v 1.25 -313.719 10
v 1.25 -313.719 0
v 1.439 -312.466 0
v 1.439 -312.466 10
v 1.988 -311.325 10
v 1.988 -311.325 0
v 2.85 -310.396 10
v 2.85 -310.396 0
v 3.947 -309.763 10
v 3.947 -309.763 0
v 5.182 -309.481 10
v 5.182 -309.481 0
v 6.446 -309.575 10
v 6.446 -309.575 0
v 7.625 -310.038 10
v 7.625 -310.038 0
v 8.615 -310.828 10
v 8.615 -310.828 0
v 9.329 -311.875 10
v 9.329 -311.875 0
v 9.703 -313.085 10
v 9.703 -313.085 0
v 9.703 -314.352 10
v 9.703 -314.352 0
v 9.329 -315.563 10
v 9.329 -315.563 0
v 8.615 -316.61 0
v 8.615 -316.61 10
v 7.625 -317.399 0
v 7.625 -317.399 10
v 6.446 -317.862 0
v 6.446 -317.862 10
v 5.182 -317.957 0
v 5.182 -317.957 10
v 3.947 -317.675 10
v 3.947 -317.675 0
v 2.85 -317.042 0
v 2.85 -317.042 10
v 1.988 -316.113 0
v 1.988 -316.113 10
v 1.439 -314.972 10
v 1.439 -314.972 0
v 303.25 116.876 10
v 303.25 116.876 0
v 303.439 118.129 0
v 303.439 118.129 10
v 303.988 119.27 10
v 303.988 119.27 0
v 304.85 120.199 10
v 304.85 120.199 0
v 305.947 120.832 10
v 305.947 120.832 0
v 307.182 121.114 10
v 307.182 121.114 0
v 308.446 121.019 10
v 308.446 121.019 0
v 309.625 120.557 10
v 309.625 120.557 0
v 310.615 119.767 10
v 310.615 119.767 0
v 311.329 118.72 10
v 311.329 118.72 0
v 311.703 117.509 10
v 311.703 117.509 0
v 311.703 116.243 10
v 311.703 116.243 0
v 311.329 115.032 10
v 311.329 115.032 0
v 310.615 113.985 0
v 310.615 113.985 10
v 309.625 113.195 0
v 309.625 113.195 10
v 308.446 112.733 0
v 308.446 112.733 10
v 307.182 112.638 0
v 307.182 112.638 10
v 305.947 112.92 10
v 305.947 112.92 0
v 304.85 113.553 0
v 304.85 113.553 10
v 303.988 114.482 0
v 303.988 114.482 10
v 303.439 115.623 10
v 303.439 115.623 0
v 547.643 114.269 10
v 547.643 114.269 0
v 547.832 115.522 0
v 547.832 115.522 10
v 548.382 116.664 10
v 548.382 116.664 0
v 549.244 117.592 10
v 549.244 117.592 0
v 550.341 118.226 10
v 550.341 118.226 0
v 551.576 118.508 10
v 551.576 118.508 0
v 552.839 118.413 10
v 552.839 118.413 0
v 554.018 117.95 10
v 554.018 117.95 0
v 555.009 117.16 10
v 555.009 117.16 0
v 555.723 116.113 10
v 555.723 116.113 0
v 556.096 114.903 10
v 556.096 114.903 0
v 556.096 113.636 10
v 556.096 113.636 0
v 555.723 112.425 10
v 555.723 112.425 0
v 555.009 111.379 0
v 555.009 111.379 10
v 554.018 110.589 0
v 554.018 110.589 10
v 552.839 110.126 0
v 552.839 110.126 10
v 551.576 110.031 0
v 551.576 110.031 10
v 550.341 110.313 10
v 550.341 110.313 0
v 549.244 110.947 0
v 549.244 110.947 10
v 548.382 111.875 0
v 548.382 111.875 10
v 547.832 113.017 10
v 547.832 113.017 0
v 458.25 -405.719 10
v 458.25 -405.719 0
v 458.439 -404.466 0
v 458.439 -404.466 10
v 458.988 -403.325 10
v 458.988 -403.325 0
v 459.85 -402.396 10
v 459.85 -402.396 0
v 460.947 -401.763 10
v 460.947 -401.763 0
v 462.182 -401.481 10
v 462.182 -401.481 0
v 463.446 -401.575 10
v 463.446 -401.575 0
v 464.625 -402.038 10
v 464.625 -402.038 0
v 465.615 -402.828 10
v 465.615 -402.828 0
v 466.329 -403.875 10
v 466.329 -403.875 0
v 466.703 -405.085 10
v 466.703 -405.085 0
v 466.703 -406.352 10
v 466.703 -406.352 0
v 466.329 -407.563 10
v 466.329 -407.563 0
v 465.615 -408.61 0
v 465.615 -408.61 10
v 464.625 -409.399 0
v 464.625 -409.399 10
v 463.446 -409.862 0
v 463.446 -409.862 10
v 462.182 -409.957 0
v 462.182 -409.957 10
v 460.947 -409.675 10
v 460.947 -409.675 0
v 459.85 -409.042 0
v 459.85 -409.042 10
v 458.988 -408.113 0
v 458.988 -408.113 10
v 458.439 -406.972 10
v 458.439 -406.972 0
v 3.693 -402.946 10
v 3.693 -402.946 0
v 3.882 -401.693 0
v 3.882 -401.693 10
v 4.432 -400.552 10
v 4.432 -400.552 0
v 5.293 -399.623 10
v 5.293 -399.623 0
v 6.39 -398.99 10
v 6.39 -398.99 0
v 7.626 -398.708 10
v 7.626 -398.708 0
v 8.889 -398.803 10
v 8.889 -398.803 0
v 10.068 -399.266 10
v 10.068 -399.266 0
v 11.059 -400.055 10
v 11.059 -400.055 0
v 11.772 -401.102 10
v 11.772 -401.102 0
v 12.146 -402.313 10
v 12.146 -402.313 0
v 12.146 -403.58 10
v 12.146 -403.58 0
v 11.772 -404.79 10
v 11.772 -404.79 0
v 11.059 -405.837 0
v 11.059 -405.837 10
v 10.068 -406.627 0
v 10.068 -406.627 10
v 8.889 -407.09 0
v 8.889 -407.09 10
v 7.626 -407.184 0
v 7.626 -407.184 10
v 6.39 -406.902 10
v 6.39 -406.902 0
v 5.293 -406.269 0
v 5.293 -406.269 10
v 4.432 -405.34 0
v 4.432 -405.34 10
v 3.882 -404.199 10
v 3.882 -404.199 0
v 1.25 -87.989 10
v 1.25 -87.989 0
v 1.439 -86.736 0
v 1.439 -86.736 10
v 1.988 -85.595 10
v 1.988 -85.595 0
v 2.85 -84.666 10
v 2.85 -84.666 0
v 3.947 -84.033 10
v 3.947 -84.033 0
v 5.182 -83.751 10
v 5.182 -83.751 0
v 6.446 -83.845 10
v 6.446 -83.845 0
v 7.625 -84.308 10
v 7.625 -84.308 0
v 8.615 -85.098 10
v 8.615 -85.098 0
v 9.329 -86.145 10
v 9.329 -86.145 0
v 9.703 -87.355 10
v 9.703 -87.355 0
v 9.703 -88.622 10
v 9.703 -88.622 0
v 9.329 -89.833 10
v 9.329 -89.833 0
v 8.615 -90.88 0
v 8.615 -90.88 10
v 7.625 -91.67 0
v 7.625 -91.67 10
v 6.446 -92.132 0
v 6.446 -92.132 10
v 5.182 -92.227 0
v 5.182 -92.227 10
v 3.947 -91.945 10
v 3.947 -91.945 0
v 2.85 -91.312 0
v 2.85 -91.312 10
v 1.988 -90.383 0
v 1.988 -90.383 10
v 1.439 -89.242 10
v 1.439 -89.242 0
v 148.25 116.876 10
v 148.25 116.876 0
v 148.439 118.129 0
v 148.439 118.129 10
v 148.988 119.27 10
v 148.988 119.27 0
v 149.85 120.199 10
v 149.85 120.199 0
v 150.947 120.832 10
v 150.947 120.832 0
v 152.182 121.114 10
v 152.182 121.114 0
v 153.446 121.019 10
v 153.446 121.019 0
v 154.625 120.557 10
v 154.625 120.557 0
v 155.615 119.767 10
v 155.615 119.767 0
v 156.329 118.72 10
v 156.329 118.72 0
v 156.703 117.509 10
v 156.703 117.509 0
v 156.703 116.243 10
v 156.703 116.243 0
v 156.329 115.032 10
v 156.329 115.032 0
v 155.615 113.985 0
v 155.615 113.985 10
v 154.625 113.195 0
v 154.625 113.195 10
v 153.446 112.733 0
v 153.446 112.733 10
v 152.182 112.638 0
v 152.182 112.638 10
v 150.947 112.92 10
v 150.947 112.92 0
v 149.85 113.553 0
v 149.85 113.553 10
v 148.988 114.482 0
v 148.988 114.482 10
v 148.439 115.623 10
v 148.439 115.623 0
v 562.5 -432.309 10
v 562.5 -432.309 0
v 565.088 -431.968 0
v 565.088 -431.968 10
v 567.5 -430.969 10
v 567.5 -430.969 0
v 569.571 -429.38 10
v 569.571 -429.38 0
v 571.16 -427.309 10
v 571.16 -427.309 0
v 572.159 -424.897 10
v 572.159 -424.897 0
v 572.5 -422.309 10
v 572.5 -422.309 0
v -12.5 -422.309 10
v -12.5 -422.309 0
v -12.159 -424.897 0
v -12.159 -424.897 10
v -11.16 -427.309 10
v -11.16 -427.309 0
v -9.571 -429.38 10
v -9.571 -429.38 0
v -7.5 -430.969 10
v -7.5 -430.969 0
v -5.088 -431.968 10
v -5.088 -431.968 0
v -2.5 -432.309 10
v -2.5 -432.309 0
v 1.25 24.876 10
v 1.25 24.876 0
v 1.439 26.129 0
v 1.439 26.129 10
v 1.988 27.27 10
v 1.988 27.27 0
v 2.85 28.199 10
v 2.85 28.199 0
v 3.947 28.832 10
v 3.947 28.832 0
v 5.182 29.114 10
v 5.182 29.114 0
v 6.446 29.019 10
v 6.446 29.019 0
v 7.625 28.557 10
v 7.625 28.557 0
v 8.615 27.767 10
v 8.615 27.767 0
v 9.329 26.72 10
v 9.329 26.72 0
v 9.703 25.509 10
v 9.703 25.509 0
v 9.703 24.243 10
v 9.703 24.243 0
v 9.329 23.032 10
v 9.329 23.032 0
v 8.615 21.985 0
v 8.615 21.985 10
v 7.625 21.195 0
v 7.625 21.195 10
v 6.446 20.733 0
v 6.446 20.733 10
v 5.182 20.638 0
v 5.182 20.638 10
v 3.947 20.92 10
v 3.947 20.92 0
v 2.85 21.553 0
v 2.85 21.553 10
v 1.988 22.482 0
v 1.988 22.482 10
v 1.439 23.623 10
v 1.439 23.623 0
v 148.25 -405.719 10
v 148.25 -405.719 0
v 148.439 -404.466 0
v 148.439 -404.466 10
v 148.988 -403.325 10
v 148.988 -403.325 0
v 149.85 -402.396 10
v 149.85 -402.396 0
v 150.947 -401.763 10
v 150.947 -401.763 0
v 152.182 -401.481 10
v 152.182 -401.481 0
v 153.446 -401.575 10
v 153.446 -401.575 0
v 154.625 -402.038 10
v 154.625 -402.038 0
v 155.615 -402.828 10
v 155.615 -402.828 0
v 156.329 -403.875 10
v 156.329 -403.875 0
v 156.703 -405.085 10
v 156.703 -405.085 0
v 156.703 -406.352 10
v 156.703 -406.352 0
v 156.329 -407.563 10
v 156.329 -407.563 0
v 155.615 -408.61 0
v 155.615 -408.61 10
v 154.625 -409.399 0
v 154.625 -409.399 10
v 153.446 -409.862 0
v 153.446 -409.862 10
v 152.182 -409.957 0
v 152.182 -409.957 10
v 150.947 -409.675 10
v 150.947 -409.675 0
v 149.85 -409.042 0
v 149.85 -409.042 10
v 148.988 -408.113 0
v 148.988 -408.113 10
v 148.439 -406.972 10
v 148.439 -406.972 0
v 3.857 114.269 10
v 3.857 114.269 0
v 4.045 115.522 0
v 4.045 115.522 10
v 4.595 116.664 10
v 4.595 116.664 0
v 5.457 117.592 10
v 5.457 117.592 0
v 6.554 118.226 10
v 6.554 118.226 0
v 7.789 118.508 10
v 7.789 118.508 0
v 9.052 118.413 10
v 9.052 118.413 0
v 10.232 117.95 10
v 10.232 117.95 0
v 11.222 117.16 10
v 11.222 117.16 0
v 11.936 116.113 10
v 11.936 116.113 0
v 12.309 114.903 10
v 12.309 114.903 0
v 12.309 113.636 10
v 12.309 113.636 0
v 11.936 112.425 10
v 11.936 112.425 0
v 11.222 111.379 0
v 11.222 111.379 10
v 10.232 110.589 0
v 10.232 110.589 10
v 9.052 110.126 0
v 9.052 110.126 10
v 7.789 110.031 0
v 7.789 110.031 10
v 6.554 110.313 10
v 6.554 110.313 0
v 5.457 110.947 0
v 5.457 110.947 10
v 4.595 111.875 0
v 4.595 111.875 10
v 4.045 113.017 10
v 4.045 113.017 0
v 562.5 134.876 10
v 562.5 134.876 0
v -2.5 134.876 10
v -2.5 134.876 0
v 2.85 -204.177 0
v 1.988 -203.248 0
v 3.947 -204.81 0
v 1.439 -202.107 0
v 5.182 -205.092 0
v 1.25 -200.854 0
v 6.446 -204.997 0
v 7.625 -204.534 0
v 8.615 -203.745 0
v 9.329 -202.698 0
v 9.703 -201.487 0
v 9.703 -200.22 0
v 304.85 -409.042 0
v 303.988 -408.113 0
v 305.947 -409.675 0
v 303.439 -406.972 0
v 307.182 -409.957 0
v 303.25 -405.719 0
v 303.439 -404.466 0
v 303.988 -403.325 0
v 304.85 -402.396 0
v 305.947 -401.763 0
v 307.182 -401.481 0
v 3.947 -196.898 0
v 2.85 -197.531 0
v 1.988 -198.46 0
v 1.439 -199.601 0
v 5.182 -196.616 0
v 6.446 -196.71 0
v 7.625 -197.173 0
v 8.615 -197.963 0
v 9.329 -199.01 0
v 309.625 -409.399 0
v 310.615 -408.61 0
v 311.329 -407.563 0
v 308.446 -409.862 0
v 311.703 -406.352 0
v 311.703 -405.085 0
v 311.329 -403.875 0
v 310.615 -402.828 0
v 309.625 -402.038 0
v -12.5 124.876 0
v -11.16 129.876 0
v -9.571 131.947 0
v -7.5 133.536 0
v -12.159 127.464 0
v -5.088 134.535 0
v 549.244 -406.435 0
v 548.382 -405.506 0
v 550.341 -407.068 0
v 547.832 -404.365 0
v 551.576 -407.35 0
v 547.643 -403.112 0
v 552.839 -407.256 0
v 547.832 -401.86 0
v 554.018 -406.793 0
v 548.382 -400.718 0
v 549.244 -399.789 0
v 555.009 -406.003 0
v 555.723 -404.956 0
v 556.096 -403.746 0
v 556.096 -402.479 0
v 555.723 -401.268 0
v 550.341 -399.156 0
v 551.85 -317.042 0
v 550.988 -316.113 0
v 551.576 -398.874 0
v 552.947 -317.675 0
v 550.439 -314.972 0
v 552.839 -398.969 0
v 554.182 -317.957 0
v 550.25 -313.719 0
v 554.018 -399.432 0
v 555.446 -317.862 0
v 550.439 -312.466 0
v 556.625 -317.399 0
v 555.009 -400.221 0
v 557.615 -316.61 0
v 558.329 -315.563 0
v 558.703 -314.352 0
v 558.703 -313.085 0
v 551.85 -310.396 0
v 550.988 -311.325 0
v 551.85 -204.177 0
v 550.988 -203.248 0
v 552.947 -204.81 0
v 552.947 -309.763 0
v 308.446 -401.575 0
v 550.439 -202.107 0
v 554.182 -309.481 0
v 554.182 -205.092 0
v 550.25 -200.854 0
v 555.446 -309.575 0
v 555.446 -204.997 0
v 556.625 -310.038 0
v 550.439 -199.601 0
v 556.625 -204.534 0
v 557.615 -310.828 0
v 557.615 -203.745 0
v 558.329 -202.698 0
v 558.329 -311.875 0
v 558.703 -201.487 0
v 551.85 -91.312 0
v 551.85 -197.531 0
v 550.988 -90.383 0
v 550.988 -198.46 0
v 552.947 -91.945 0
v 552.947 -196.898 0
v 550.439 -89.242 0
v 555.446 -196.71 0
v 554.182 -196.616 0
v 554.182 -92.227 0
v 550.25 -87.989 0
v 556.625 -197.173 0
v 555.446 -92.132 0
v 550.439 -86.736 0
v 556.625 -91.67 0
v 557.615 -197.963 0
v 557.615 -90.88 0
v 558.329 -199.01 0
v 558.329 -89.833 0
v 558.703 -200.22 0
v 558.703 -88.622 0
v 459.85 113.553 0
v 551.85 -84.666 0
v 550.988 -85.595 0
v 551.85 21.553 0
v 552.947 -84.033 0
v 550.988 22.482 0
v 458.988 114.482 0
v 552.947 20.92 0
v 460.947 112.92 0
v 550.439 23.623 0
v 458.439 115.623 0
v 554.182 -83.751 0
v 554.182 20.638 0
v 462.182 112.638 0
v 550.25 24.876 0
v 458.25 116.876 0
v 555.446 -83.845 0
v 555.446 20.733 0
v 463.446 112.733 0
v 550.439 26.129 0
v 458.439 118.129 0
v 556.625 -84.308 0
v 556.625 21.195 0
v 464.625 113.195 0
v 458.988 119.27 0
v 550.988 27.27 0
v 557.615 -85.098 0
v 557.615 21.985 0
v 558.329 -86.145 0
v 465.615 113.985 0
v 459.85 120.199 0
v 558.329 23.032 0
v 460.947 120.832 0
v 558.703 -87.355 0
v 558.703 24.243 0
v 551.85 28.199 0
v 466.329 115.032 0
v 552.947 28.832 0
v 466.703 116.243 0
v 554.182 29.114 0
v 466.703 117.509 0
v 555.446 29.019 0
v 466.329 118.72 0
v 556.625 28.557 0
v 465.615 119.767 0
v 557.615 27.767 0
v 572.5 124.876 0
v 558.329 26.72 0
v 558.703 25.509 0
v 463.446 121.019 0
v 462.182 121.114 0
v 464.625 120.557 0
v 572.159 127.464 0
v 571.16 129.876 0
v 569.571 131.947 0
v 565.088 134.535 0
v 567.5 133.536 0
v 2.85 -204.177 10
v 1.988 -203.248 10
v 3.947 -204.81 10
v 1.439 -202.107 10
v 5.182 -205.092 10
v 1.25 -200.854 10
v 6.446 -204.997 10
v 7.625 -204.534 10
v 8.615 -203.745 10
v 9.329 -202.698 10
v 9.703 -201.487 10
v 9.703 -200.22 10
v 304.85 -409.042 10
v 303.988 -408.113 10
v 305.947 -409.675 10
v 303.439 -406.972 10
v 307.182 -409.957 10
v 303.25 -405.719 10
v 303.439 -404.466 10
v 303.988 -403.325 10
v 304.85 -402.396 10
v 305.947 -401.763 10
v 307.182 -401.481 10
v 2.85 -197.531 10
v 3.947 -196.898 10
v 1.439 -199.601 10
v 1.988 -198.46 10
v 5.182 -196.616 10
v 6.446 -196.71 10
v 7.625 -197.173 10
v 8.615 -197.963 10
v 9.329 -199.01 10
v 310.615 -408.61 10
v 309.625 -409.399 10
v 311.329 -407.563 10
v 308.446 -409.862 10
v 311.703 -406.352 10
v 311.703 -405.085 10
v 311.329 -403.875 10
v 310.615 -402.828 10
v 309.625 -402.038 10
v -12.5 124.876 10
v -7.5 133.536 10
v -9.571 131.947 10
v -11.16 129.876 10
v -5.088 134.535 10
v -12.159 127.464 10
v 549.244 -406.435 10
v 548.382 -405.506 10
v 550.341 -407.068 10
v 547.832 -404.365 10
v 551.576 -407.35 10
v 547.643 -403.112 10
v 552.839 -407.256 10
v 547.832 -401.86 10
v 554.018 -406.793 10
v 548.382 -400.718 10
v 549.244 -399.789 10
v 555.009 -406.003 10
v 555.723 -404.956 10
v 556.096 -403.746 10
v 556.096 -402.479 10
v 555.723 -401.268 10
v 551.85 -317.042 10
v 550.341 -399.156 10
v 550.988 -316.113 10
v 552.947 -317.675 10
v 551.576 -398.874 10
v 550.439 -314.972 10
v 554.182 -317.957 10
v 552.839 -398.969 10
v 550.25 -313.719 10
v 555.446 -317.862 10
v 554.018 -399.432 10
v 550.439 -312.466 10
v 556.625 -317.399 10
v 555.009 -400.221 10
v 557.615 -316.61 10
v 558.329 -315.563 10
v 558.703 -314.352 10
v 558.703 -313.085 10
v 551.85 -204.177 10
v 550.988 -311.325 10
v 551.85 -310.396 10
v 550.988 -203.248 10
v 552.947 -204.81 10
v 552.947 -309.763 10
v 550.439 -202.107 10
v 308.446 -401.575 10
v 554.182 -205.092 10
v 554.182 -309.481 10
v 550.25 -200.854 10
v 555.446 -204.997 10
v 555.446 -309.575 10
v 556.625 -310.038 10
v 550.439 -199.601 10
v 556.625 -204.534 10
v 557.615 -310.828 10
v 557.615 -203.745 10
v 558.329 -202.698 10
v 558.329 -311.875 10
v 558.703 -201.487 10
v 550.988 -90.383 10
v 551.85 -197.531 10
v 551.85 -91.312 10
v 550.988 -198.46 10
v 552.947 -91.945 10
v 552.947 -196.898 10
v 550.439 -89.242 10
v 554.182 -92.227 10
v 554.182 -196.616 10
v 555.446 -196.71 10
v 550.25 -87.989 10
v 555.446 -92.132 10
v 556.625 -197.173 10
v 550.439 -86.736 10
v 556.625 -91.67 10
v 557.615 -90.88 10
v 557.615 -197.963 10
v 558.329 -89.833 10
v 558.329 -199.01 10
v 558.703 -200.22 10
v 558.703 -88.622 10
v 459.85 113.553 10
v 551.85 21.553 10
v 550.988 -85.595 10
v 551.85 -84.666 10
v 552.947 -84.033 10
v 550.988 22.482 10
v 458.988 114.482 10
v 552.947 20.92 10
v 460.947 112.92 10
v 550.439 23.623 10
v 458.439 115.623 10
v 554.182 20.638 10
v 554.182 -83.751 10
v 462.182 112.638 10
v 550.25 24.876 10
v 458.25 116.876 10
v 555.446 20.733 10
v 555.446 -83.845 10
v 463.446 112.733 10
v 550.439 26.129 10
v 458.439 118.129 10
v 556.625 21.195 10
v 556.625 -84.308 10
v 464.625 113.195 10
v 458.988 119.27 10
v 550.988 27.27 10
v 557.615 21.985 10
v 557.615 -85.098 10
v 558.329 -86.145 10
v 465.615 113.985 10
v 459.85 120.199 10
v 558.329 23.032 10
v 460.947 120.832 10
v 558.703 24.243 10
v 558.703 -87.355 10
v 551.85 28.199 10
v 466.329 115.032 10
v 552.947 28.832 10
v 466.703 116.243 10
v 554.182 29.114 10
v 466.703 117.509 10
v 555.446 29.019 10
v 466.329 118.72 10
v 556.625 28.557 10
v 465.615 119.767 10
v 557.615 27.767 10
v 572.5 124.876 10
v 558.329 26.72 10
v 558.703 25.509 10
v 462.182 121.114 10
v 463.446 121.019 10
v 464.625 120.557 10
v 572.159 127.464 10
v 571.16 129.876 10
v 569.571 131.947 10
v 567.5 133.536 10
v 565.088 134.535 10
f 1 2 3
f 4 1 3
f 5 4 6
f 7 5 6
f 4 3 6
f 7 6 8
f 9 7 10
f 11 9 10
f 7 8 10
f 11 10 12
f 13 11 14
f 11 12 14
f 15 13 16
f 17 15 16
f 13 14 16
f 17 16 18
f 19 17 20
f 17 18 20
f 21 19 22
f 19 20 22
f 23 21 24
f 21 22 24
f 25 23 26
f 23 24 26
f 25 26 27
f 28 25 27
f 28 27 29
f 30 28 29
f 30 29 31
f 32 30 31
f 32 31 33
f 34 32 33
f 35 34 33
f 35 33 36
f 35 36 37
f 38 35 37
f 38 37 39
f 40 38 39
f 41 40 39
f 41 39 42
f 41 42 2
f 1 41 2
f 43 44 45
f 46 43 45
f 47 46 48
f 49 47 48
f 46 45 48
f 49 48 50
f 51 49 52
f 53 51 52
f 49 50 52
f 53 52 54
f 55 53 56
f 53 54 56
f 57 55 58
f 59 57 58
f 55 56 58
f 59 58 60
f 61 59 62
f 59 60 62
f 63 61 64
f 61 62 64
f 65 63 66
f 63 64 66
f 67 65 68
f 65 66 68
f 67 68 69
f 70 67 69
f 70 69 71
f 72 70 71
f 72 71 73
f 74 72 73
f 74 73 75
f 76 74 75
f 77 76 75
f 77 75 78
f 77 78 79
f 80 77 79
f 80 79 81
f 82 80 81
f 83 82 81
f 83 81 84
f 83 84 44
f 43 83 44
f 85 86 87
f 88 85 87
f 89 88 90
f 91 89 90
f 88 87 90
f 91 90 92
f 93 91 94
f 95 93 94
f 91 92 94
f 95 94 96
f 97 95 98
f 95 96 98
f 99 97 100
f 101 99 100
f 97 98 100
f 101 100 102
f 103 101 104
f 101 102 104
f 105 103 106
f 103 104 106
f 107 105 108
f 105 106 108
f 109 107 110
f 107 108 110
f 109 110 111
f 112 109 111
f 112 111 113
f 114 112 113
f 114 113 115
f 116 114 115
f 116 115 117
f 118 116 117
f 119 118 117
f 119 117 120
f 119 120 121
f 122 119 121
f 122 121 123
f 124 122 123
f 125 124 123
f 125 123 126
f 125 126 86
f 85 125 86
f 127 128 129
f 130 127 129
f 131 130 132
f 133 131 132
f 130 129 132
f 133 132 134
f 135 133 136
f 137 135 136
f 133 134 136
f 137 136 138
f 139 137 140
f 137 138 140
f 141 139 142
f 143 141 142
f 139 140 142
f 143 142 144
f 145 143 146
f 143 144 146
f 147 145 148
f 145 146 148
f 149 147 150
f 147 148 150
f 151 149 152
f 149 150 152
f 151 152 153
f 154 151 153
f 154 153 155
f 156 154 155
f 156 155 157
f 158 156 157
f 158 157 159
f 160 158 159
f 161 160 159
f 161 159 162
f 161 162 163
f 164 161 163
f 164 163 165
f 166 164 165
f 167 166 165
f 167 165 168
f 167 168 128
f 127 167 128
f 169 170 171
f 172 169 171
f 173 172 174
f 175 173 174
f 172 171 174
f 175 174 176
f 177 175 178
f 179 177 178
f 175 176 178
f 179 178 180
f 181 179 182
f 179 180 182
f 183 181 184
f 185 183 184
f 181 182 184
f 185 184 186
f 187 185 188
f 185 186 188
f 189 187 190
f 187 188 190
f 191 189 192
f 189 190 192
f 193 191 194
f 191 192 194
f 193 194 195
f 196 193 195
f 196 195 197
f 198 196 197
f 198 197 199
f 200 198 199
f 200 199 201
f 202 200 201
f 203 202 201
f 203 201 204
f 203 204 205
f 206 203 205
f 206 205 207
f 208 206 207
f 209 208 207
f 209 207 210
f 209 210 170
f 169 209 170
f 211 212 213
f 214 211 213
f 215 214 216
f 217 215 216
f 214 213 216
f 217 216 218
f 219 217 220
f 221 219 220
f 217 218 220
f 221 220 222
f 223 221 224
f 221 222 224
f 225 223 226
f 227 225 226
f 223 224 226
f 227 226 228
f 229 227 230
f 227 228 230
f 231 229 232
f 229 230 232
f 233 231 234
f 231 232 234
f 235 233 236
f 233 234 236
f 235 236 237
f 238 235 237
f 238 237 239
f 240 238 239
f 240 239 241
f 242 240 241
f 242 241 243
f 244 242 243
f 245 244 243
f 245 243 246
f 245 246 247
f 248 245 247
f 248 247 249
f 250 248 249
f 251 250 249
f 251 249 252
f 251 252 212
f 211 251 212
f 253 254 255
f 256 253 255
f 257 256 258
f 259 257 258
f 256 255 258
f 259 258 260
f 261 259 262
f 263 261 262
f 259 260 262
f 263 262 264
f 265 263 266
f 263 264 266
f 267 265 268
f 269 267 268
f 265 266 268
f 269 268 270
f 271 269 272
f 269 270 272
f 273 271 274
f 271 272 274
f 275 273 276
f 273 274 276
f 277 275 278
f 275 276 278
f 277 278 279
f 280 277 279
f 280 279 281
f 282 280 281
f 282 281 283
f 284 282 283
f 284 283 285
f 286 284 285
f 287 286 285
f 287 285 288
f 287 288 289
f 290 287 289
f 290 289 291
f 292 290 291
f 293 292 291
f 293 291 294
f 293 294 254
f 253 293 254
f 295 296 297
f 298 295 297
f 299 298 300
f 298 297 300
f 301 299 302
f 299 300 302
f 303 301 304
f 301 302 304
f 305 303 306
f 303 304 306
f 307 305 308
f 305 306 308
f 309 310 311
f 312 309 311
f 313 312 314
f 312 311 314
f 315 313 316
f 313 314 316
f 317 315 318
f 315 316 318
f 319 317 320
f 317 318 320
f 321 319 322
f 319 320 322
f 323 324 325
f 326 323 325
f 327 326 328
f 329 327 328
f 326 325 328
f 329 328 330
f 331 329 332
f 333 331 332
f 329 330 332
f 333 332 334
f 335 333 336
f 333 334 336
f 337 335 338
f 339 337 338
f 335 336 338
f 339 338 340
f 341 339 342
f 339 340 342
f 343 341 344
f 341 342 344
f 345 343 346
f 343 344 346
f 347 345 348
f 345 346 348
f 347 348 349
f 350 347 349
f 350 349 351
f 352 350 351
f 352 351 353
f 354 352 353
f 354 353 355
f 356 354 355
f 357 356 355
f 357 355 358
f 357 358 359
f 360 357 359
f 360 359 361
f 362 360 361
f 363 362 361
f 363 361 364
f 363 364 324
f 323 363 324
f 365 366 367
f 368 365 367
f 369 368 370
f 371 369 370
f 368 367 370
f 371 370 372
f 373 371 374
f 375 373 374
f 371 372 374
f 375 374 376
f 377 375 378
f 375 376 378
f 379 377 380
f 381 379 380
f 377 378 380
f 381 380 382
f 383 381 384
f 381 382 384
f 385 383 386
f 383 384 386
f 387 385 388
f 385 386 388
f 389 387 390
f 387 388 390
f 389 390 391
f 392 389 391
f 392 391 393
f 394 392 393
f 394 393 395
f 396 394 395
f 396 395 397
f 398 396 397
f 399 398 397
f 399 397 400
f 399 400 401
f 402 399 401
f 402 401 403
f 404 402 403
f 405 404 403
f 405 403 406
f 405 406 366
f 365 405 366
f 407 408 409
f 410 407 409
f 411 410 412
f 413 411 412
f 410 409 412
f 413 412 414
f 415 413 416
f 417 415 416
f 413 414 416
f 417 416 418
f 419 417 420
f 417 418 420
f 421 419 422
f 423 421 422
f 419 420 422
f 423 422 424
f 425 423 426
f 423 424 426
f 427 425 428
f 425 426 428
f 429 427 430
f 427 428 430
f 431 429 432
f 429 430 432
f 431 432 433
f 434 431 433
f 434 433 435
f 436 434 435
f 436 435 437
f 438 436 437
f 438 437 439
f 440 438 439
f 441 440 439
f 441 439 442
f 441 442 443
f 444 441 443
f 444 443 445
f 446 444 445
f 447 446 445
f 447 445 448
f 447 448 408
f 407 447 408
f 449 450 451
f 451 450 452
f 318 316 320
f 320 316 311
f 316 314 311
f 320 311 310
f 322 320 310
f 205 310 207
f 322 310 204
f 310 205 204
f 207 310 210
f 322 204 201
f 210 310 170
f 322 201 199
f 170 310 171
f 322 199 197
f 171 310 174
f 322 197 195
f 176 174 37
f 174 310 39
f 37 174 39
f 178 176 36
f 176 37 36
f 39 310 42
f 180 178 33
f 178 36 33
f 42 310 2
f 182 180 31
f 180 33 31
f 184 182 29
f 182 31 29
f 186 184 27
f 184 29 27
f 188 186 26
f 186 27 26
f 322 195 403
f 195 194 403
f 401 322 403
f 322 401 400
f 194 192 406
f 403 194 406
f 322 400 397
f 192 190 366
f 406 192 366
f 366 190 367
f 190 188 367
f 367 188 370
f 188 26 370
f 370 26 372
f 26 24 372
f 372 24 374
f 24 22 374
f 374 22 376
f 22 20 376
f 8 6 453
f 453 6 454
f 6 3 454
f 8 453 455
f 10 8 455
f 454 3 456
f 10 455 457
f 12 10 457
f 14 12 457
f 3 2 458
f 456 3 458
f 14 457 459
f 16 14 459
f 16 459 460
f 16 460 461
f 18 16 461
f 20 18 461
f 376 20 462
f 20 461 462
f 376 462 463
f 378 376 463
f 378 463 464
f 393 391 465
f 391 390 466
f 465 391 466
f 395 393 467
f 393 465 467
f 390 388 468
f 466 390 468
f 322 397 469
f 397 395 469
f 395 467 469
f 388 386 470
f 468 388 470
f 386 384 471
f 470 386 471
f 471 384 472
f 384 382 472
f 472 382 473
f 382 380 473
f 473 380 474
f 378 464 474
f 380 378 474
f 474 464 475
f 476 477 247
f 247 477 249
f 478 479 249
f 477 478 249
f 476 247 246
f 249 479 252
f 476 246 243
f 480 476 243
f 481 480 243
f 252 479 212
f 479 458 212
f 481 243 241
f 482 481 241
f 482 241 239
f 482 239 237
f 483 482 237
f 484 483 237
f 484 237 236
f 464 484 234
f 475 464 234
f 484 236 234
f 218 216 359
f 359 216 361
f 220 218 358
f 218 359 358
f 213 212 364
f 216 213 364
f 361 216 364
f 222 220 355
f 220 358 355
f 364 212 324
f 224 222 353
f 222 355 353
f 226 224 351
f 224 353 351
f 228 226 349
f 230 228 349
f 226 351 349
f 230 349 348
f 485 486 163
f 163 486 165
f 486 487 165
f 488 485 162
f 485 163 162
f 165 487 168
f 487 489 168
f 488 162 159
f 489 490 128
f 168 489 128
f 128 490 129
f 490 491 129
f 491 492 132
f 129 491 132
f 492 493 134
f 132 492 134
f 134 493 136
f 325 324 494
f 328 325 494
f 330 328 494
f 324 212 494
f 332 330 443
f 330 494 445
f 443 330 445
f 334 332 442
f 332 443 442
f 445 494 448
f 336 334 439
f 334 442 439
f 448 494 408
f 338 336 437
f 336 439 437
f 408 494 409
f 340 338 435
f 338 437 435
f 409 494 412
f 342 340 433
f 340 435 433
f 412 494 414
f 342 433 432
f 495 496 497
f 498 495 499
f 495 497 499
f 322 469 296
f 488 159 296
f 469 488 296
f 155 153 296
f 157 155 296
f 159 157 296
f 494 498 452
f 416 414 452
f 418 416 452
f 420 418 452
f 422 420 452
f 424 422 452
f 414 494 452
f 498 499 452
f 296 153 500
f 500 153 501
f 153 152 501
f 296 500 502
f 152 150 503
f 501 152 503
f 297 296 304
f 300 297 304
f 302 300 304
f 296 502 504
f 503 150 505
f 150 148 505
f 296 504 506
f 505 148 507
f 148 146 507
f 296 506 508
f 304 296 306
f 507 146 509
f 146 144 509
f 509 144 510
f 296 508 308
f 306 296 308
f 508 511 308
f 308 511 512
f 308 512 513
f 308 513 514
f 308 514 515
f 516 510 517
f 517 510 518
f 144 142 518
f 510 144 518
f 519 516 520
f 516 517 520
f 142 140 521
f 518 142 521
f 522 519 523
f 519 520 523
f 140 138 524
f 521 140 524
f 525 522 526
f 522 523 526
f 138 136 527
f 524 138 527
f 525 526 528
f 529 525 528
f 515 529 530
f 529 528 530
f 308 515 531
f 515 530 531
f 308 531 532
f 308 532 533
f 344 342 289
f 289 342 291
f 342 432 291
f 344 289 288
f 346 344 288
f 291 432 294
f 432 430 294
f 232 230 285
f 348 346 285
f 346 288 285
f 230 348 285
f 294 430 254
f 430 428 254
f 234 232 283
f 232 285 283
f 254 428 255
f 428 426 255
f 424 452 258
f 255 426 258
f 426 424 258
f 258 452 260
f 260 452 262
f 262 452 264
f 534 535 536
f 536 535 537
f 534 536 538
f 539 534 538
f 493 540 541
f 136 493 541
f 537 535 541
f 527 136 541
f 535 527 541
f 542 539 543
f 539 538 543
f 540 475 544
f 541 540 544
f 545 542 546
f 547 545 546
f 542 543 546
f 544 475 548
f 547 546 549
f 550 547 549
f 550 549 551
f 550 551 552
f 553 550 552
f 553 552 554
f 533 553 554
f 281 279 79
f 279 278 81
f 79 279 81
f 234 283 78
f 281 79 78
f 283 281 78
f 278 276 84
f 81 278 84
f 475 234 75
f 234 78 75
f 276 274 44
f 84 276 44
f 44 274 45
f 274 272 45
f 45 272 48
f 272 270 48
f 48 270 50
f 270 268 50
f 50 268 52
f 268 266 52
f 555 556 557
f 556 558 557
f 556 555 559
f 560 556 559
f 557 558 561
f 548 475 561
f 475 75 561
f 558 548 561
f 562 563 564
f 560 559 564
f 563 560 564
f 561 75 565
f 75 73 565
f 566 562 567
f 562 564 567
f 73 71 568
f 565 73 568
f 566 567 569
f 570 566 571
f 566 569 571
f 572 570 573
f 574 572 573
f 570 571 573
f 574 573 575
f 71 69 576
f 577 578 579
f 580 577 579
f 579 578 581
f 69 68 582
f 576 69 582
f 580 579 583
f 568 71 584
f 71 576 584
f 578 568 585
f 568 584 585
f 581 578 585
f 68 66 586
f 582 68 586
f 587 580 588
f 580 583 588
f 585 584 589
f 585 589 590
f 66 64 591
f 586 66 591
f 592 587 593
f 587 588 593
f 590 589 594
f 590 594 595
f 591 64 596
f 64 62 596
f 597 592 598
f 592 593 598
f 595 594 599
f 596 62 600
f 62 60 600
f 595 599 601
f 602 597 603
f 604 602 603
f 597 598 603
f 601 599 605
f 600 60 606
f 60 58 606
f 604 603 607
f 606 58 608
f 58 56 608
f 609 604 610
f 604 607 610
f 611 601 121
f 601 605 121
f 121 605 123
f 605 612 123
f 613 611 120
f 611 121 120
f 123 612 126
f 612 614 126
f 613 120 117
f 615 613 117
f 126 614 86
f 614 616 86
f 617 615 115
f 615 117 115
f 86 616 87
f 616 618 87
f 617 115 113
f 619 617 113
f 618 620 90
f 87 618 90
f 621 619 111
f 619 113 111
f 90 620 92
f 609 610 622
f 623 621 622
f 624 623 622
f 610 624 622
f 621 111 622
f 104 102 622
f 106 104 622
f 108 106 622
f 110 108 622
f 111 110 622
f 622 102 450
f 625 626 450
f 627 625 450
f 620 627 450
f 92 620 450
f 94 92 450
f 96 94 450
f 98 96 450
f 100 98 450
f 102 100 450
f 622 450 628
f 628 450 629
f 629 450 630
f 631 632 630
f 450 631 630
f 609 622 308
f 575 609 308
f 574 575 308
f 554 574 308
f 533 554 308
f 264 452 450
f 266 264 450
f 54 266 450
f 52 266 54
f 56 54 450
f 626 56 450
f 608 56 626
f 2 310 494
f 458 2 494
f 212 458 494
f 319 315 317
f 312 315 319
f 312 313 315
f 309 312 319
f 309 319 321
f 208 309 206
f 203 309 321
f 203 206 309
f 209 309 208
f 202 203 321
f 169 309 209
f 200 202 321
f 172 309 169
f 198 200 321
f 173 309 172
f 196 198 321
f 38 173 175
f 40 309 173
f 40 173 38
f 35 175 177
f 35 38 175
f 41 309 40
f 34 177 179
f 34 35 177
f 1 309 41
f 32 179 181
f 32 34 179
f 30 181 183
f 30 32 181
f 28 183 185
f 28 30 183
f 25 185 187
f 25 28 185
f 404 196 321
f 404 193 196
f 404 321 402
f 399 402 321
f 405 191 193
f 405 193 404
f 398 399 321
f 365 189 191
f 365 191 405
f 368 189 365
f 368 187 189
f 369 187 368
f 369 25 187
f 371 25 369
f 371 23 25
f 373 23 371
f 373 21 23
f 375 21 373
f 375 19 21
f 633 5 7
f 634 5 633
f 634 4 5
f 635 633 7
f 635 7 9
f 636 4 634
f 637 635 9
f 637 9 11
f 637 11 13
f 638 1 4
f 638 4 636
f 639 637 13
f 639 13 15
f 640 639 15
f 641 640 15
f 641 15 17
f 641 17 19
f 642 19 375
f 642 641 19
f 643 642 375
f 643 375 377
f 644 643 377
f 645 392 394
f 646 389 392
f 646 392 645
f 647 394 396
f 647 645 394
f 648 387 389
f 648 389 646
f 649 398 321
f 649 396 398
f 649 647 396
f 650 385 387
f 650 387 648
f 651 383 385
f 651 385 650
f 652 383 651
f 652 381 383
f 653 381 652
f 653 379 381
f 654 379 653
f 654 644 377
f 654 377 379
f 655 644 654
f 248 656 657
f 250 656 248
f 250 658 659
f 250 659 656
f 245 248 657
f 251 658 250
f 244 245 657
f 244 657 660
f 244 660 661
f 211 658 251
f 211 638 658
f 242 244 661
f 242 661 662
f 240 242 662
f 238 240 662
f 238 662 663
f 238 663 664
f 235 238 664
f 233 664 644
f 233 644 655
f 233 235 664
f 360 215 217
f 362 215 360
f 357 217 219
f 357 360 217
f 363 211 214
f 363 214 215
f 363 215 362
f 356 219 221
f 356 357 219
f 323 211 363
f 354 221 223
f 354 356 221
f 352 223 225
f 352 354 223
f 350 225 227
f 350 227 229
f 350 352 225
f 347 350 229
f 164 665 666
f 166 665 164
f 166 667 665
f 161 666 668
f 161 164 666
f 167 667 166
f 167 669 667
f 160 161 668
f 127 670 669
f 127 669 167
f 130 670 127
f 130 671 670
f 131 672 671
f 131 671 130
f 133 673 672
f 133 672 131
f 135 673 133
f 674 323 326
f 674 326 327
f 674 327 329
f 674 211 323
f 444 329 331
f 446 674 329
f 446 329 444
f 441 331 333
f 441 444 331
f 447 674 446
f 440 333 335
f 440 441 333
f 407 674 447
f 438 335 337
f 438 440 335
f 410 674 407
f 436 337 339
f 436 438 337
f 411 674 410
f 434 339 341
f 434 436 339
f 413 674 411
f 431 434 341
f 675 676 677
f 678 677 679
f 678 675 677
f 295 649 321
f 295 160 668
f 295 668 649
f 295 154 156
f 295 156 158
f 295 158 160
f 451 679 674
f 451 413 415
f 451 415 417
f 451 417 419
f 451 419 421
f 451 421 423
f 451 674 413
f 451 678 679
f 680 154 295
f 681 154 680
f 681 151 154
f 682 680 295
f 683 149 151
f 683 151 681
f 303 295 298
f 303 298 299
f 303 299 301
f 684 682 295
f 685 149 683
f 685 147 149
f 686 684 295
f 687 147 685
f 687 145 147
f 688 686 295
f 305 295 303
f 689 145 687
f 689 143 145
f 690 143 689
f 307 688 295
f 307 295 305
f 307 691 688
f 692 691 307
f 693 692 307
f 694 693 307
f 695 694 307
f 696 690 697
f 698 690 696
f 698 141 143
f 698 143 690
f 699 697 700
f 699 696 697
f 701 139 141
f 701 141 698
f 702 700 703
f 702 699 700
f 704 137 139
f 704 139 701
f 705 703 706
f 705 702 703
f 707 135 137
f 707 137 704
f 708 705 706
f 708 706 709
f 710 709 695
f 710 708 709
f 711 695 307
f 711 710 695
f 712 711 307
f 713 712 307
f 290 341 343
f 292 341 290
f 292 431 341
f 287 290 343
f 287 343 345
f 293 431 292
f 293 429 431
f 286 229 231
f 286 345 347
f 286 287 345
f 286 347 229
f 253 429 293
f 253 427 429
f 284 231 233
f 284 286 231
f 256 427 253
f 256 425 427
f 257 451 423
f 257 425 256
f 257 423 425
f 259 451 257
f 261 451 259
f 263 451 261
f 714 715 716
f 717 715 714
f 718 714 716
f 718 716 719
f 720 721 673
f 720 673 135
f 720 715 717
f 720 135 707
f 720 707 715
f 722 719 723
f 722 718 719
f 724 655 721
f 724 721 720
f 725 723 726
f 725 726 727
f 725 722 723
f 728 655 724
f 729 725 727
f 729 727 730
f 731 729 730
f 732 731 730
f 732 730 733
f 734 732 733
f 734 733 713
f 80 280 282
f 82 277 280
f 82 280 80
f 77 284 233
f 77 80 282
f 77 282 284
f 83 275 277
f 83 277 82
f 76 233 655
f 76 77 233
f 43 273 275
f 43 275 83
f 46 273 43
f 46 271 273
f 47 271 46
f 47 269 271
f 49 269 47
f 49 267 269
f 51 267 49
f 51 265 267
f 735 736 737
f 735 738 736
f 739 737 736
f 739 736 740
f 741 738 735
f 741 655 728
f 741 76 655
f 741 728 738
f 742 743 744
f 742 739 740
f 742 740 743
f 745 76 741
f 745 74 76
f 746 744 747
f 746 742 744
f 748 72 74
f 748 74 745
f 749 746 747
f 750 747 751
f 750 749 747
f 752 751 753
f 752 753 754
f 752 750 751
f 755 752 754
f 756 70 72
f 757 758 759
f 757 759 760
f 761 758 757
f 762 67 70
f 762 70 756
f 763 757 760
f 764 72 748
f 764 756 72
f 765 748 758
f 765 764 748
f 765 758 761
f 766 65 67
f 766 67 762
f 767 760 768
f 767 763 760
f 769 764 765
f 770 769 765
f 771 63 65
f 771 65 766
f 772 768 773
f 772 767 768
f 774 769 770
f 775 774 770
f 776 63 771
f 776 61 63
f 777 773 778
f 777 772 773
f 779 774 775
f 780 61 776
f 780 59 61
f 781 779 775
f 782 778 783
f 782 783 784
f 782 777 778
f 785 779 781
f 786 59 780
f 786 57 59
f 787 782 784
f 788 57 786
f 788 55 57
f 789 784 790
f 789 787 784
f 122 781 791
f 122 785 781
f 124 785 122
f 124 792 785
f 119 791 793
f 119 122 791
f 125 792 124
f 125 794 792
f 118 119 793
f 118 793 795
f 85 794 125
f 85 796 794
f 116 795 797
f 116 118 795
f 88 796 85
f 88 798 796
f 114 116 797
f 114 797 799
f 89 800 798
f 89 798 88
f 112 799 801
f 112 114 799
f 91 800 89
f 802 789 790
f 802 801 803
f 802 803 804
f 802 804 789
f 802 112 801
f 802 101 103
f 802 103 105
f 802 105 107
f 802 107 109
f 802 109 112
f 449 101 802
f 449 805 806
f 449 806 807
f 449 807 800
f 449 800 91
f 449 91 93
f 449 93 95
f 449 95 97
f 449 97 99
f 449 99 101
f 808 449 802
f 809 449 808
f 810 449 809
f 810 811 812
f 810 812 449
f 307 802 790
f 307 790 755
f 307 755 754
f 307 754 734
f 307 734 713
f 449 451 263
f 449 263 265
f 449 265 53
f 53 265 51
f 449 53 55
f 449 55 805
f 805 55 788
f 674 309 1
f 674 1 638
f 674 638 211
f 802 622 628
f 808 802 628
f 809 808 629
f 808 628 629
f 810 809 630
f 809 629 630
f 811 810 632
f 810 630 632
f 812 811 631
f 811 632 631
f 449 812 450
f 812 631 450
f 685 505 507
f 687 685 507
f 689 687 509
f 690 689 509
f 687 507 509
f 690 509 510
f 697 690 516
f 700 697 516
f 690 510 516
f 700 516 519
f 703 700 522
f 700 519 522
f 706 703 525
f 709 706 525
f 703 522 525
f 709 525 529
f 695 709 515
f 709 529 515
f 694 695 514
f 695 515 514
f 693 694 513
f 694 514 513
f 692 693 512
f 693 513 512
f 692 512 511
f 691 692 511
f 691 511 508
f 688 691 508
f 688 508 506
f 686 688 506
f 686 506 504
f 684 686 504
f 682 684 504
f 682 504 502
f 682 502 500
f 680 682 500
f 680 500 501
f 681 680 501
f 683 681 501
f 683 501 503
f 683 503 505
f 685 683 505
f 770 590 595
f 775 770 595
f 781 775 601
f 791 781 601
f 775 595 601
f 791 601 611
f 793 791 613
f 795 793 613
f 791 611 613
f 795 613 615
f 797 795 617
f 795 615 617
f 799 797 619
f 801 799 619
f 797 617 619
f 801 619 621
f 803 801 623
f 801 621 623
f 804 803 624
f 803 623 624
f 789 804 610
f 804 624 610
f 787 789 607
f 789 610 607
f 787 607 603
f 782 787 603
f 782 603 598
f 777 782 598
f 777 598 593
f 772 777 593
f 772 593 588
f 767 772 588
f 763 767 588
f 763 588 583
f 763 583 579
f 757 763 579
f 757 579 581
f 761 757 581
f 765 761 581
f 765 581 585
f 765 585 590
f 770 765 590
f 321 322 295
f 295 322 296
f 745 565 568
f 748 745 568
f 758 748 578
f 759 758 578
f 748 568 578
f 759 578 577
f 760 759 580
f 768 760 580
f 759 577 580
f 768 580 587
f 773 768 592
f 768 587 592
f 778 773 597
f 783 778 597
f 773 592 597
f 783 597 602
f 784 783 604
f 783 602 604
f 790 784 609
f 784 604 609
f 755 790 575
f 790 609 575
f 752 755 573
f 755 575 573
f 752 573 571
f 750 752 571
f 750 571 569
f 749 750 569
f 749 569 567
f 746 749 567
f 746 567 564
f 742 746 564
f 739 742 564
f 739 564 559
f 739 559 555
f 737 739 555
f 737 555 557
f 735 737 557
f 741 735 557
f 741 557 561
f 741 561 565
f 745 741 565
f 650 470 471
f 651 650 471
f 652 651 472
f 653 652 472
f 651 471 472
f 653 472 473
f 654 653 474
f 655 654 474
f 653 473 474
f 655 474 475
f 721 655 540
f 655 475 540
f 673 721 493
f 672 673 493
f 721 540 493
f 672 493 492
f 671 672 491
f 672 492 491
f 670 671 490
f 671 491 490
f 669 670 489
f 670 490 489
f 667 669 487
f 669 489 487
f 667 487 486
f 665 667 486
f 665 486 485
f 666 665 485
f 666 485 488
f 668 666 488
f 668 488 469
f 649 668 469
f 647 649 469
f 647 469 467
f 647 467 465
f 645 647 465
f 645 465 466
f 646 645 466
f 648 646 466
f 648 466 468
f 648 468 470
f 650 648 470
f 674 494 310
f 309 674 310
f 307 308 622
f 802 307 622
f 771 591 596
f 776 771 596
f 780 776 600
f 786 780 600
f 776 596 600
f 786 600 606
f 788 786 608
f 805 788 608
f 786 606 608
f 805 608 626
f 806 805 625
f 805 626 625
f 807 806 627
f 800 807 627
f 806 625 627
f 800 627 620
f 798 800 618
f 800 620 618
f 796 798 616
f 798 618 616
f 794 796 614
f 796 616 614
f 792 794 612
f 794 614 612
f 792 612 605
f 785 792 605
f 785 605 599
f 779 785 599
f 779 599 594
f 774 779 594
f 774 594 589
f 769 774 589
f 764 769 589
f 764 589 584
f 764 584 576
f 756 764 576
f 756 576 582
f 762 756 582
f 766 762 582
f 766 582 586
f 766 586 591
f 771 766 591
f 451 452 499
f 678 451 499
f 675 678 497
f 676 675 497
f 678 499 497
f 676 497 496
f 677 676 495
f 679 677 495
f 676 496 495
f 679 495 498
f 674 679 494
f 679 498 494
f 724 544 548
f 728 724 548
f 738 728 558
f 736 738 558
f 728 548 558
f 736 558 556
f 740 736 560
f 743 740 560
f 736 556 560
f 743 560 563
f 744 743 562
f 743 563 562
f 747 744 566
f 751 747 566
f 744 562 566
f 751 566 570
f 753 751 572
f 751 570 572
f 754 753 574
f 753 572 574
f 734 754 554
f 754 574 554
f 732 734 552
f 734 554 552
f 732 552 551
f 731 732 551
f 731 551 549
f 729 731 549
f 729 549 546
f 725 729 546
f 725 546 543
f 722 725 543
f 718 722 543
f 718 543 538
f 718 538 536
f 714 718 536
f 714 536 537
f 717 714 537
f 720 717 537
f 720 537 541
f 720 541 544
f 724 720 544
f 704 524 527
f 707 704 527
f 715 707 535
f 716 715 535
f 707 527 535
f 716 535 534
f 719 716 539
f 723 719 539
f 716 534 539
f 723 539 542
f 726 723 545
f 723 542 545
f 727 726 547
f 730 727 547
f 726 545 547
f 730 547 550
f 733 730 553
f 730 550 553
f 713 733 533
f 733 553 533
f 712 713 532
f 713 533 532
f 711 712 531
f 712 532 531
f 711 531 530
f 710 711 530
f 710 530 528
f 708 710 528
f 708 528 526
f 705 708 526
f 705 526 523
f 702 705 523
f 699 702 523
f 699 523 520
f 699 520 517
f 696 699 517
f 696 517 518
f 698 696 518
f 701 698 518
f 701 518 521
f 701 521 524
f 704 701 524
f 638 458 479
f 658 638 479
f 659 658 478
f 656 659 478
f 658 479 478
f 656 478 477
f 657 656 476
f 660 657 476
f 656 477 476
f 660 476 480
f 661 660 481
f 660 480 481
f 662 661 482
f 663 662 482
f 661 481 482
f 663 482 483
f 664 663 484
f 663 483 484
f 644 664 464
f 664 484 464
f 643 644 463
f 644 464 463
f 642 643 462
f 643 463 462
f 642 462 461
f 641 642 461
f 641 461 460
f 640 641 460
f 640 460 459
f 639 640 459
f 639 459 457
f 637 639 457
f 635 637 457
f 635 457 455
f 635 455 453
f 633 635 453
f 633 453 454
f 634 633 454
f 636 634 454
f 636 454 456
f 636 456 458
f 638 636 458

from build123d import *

# Parameters (mm, degrees)
BOSS_EXTRUDE1_DEPTH    = 10
M10X1_5_TAPPED_HOLE2_D = 8.5


with BuildPart() as part:
    # Sketch1 → Boss-Extrude1 (new body)
    with BuildSketch(Plane.XY):
        with BuildLine():
            Line((-2.5, -432.308814801), (562.5, -432.308814801))
            ThreePointArc((562.5, -432.308814801), (569.571067812, -429.379882613), (572.5, -422.308814801))
            Line((572.5, -422.308814801), (572.5, 124.876051617))
            ThreePointArc((572.5, 124.876051617), (569.571067812, 131.947119429), (562.5, 134.876051617))
            Line((562.5, 134.876051617), (-2.5, 134.876051617))
            ThreePointArc((-2.5, 134.876051617), (-9.571067812, 131.947119429), (-12.5, 124.876051617))
            Line((-12.5, 124.876051617), (-12.5, -422.308814801))
            ThreePointArc((-12.5, -422.308814801), (-9.571067812, -429.379882613), (-2.5, -432.308814801))
        make_face()
    extrude(amount=BOSS_EXTRUDE1_DEPTH)

    # M10x1.5 Tapped Hole2 (through all)
    with Locations(Plane.XY.offset(10)):
        with Locations((8.106601718, 114.269449899), (152.5, 116.876051617), (307.5, 116.876051617), (462.5, 116.876051617), (551.893398282, 114.269449899), (554.5, 24.876051617), (554.5, -87.988903856), (554.5, -200.853859328), (554.5, -313.718814801), (551.893398282, -403.112213083), (462.5, -405.718814801), (307.5, -405.718814801), (152.5, -405.718814801), (7.943137307, -402.946189682), (5.5, -313.718814801), (5.5, -200.853859328), (5.5, -87.988903856), (5.5, 24.876051617)):
            Hole(M10X1_5_TAPPED_HOLE2_D / 2)


solid = part.part
